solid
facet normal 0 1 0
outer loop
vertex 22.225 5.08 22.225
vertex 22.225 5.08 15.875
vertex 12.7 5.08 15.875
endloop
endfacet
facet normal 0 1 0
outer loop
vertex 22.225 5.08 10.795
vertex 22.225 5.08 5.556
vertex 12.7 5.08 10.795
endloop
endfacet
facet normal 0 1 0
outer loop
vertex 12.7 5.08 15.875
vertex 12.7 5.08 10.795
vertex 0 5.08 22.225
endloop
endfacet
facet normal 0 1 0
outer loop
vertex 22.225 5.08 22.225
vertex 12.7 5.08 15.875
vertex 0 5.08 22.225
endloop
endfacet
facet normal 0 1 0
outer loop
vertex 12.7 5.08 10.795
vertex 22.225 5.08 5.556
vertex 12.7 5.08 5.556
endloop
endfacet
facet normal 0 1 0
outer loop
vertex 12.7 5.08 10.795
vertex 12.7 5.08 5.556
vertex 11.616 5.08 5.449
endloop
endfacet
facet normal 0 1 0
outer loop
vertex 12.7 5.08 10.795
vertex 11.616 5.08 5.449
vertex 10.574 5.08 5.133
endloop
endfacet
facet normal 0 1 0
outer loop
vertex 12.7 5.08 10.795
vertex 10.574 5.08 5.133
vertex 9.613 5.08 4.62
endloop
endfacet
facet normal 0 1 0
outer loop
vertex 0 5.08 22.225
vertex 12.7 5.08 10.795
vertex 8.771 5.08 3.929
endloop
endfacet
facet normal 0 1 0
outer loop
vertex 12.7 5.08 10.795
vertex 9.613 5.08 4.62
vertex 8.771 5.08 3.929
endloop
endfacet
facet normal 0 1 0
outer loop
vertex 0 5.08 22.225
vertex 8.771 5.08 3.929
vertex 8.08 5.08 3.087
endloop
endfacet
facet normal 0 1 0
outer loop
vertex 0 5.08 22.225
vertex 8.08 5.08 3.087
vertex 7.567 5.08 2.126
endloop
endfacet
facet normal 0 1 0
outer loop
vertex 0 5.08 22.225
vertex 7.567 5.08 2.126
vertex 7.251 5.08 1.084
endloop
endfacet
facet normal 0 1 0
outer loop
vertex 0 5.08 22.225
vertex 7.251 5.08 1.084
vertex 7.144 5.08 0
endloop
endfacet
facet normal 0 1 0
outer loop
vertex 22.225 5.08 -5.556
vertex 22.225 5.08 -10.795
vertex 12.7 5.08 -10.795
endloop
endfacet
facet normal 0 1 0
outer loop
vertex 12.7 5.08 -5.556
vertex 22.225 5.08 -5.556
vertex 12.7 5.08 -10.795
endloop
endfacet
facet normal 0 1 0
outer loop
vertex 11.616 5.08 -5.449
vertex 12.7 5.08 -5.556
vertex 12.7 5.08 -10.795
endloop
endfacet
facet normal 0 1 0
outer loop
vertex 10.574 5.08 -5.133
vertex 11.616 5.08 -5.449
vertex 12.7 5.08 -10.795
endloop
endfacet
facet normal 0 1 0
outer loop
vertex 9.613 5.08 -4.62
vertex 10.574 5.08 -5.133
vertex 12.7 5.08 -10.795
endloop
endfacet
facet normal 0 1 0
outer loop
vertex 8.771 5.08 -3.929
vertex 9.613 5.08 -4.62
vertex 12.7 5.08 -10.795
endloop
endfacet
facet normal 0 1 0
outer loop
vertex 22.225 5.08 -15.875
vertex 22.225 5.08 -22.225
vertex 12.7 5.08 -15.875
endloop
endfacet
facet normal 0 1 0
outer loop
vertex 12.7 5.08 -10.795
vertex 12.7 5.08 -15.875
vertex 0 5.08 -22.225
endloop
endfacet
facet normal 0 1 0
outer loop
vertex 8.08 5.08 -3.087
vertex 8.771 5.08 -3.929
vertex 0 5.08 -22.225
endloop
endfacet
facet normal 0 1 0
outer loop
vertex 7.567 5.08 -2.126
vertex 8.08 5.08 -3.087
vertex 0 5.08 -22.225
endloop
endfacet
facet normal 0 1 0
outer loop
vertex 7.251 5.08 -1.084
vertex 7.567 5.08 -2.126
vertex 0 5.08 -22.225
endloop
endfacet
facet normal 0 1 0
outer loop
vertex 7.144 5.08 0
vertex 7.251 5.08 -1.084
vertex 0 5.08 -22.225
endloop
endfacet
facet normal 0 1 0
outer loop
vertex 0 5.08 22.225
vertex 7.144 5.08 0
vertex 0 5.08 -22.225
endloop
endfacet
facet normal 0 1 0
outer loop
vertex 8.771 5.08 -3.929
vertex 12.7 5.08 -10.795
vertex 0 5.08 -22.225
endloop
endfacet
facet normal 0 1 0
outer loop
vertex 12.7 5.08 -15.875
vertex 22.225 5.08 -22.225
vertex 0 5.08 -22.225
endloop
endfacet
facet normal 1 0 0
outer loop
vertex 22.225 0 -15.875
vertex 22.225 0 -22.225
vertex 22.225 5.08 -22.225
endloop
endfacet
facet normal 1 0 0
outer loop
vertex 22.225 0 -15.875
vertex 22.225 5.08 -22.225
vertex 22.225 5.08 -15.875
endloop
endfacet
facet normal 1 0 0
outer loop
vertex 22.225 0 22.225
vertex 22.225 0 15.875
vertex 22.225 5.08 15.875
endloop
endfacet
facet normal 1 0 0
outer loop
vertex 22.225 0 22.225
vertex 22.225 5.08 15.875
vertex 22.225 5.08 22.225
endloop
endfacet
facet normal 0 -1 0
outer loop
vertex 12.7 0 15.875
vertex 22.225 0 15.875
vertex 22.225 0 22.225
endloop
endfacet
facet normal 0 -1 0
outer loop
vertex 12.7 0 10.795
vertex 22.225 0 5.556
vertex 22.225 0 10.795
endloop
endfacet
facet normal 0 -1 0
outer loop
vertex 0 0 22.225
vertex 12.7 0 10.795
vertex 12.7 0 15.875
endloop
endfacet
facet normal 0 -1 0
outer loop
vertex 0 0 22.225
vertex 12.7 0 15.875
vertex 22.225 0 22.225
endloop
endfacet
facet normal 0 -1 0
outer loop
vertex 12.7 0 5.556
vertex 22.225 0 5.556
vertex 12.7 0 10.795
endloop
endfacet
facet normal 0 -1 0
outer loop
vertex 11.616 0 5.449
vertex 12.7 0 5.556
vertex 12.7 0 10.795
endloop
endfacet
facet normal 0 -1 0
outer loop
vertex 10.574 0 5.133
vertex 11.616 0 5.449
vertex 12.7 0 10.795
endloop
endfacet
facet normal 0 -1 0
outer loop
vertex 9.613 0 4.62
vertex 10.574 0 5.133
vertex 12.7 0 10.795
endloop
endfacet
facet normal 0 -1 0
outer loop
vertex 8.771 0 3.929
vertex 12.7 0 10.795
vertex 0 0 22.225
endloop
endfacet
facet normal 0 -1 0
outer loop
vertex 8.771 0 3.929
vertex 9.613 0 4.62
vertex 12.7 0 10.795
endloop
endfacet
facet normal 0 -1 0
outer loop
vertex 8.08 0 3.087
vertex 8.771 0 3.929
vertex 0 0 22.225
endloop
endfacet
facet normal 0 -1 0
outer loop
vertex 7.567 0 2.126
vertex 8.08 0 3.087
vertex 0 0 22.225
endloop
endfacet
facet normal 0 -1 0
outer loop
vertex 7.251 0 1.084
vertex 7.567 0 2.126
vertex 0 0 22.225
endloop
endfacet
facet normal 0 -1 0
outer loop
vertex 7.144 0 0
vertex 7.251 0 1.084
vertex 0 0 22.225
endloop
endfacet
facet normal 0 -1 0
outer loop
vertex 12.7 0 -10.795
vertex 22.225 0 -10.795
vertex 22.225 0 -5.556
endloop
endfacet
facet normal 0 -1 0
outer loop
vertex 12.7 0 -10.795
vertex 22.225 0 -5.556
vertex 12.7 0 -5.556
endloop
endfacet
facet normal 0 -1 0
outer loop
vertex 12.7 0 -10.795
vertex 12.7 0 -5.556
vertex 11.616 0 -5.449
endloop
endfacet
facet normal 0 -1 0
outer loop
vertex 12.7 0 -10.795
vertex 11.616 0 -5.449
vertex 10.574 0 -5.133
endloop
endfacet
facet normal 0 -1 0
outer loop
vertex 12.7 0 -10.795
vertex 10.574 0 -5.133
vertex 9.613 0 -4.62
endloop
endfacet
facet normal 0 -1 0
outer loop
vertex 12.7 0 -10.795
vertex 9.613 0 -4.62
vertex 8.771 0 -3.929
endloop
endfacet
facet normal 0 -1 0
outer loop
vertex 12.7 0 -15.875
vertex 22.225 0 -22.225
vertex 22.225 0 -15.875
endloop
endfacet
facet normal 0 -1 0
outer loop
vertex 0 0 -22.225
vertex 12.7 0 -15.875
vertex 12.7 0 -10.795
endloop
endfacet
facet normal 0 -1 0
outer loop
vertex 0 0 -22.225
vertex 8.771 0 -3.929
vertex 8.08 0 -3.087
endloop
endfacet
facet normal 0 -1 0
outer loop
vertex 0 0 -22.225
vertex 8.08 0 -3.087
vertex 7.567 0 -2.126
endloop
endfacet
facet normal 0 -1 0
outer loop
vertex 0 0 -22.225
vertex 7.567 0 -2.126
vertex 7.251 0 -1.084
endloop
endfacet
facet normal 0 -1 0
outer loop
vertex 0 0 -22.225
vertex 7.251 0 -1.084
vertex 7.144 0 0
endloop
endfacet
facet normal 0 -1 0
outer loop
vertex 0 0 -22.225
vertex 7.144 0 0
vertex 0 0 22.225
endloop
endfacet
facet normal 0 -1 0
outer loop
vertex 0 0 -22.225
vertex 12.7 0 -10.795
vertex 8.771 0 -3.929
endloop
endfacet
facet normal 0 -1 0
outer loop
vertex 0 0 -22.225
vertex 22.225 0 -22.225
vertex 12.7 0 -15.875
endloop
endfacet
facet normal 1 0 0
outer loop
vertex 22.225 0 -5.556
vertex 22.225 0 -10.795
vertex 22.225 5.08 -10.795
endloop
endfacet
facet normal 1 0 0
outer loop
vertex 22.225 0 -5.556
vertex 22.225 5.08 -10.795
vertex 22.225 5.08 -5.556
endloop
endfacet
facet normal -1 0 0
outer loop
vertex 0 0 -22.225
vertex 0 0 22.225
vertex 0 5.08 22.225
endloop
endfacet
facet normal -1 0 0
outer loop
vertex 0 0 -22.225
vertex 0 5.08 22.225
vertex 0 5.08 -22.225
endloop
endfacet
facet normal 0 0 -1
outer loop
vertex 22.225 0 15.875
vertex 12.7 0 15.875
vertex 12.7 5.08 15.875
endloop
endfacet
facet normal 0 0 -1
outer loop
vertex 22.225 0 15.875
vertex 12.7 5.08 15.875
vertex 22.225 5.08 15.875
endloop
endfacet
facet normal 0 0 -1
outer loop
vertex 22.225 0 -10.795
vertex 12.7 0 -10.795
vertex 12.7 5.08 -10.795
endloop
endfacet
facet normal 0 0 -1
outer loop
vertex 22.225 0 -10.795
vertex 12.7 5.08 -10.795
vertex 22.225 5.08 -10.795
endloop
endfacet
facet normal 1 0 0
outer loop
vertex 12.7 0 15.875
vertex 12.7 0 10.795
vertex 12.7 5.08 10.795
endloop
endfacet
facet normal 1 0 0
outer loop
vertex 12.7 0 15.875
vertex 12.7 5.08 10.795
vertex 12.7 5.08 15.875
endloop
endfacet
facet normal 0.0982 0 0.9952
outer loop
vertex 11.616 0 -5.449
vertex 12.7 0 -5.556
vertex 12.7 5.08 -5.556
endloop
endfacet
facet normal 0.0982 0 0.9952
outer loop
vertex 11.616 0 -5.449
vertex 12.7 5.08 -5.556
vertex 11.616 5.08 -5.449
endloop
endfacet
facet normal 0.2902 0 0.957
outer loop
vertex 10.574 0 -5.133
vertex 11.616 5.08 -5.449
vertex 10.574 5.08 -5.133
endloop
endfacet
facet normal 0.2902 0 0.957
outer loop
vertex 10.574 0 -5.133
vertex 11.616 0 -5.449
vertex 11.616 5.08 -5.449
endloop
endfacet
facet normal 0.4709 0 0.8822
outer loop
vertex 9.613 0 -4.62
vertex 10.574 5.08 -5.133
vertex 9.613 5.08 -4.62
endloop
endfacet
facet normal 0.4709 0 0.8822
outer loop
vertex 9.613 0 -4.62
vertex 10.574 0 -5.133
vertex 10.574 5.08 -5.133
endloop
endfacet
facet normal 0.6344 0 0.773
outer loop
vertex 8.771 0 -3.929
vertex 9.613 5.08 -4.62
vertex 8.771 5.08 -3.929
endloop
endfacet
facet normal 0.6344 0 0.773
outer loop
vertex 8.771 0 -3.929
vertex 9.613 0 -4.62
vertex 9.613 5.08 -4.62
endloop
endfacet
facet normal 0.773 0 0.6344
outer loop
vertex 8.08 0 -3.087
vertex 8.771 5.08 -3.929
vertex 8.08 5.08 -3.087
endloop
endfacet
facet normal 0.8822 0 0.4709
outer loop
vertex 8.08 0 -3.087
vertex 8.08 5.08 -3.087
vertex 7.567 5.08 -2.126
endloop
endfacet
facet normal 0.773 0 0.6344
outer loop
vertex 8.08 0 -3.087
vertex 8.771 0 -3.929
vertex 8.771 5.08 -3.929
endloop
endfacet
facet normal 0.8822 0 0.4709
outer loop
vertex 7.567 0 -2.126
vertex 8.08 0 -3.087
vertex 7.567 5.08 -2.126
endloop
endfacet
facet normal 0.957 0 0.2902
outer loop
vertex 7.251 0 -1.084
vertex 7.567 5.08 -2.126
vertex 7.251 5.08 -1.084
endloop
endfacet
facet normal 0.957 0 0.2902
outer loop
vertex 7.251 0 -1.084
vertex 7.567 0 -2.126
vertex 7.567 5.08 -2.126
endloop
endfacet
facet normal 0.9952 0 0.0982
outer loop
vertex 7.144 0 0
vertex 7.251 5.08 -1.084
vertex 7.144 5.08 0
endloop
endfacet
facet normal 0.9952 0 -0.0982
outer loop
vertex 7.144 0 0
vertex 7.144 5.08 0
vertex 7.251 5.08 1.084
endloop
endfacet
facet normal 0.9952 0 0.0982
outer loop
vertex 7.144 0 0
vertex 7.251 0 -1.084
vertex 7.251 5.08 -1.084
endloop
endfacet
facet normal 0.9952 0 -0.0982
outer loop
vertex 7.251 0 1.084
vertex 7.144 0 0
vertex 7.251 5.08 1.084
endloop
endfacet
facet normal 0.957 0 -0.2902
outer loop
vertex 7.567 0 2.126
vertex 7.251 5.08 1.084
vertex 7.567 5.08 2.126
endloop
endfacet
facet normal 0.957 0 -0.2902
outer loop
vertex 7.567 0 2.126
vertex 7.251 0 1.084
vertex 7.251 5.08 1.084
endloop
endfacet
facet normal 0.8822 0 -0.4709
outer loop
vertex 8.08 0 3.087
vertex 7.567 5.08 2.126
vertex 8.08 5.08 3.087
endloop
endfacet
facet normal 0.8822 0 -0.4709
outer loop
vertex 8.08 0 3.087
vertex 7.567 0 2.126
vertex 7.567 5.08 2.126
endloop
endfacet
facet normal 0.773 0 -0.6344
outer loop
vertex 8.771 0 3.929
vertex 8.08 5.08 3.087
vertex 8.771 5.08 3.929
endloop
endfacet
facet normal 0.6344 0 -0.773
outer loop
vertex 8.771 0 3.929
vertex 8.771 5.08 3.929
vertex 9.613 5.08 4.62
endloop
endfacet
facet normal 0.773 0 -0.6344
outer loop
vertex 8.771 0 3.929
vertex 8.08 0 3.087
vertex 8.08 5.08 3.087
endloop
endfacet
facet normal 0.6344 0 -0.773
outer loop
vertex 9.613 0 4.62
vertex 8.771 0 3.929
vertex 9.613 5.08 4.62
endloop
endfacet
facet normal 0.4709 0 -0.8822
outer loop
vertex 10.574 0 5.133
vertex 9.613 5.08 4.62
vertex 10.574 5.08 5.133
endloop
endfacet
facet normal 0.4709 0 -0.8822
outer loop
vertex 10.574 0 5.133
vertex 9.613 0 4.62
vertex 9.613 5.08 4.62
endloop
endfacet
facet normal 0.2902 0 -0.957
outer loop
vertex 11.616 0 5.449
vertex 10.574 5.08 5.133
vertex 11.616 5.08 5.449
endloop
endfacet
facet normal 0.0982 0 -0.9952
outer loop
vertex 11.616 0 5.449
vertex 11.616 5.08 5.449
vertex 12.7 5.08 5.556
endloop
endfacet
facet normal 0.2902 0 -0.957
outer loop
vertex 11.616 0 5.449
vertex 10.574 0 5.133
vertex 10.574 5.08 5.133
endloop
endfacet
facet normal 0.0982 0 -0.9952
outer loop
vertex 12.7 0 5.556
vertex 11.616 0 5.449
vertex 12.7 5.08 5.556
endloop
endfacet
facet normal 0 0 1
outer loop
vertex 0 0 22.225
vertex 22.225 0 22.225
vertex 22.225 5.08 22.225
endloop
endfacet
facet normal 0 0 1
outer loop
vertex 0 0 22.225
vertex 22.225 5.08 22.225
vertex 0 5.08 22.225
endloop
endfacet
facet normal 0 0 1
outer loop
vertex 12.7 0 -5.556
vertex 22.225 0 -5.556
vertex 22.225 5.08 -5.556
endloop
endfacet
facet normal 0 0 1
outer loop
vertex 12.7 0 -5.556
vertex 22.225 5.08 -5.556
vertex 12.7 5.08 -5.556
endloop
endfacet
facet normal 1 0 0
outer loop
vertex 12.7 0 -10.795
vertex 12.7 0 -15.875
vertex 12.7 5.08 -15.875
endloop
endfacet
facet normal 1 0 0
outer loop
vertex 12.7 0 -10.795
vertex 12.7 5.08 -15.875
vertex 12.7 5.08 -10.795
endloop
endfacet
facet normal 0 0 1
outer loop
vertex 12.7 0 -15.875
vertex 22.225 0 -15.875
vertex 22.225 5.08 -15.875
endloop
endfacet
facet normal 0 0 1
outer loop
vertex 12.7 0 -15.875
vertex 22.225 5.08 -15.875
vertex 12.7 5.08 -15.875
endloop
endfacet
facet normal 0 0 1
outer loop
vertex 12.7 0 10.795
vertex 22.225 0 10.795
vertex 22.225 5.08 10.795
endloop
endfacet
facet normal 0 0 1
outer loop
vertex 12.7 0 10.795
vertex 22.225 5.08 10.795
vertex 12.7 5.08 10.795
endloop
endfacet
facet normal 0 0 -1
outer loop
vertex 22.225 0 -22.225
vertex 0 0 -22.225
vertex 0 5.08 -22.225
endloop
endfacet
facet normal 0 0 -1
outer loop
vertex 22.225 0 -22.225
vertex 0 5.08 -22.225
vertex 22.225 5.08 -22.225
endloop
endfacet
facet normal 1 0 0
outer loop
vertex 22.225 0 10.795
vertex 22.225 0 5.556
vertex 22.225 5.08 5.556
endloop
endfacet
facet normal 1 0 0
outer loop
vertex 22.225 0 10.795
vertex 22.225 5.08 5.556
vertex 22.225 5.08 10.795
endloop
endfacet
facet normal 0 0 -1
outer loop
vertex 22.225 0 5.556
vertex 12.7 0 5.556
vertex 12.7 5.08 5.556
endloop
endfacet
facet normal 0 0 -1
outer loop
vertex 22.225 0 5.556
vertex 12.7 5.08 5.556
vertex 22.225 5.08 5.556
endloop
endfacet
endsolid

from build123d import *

# Parameters (mm, degrees)
BOSS_EXTRUDE1_DEPTH = 5.08


with BuildPart() as part:
    # Sketch1 → Boss-Extrude1 (new body)
    with BuildSketch(Plane(origin=(0, 0, 0), x_dir=(1, 0, 0), z_dir=(0, 1, 0))):
        with BuildLine():
            Line((22.225, 22.225), (22.225, 15.875))
            Line((22.225, 15.875), (12.7, 15.875))
            Line((12.7, 15.875), (12.7, 10.795))
            Line((12.7, 10.795), (22.225, 10.795))
            Line((22.225, 10.795), (22.225, 5.55625))
            Line((22.225, 5.55625), (12.7, 5.55625))
            ThreePointArc((12.7, 5.55625), (7.14375, 0), (12.7, -5.55625))
            Line((12.7, -5.55625), (22.225, -5.55625))
            Line((22.225, -5.55625), (22.225, -10.795))
            Line((22.225, -10.795), (12.7, -10.795))
            Line((12.7, -10.795), (12.7, -15.875))
            Line((12.7, -15.875), (22.225, -15.875))
            Line((22.225, -15.875), (22.225, -22.225))
            Line((22.225, -22.225), (0, -22.225))
            Line((0, -22.225), (0, 0))
            Line((0, 0), (0, 22.225))
            Line((0, 22.225), (22.225, 22.225))
        make_face()
    extrude(amount=BOSS_EXTRUDE1_DEPTH)


solid = part.part
